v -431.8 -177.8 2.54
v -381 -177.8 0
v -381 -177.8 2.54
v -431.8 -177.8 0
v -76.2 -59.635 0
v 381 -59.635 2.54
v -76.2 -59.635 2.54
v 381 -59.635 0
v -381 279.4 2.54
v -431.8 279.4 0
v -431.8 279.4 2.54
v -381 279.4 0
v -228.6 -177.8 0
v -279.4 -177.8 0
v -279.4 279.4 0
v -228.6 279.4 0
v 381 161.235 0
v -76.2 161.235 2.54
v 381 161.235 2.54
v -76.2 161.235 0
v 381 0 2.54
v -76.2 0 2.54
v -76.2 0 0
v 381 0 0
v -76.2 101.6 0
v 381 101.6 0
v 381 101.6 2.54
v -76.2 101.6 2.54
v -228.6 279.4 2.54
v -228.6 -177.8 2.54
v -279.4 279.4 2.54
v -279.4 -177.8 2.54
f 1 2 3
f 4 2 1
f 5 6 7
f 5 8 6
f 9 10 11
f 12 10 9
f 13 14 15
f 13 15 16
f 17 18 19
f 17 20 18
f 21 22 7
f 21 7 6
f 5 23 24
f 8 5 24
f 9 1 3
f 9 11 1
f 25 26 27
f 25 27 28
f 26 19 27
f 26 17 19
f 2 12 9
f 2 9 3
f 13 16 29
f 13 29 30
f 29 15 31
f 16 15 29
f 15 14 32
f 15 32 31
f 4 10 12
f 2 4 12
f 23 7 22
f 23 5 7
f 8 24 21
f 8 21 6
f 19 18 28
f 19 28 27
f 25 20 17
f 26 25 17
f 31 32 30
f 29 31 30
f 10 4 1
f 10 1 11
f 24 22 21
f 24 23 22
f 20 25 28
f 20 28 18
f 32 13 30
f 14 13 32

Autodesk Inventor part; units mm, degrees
ref_plane "YZ Plane" through (0, 0, 0) normal (1, 0, 0) x (0, 1, 0)
ref_plane "XZ Plane" through (0, 0, 0) normal (0, 1, 0) x (-1, 0, 0)
ref_plane "XY Plane" through (0, 0, 0) normal (0, 0, 1) x (1, 0, 0)
ref_plane "Work Plane1" through (0, 0, 0) normal (0, 0, 1) x (1, 0, 0)
sketch "Sketch3" plane through (0, 0, 0) normal (0, 0, 1) x (1, 0, 0)
  line L0 (-431.8, 279.4) -> (-381, 279.4)
  line L1 (-381, 279.4) -> (-381, -177.8)
  line L2 (-381, -177.8) -> (-431.8, -177.8)
  line L3 (-431.8, -177.8) -> (-431.8, 279.4)
  line L4 (-279.4, 279.4) -> (-228.6, 279.4)
  line L5 (-228.6, 279.4) -> (-228.6, -177.8)
  line L6 (-228.6, -177.8) -> (-279.4, -177.8)
  line L7 (-279.4, -177.8) -> (-279.4, 279.4)
  line L8 (-76.2, 161.2348) -> (381, 161.2348)
  line L9 (381, 161.2348) -> (381, 101.6)
  line L10 (381, 101.6) -> (-76.2, 101.6)
  line L11 (-76.2, 101.6) -> (-76.2, 161.2348)
  line L12 (-76.2, 0) -> (381, 0)
  line L13 (381, 0) -> (381, -59.6348)
  line L14 (381, -59.6348) -> (-76.2, -59.6348)
  line L15 (-76.2, -59.6348) -> (-76.2, 0)
  line L16 (-177.8, -457.2) -> (-177.8, -381) projected
  line L17 (-177.8, -381) -> (177.8, -381) projected
  line L18 (177.8, -381) -> (177.8, -457.2) projected
  line L19 (177.8, -457.2) -> (609.6, -457.2) projected
  line L20 (609.6, -457.2) -> (609.6, 457.2) projected
  line L21 (609.6, 457.2) -> (-609.6, 457.2) projected
  line L22 (-609.6, 457.2) -> (-609.6, -457.2) projected
  line L23 (-609.6, -457.2) -> (-177.8, -457.2) projected
  line L24 (-279.4, -177.8) -> (-381, -177.8) projected
  line L25 (-381, -177.8) -> (-381, 279.4) projected
  line L26 (-381, 279.4) -> (-279.4, 279.4) projected
  line L27 (-279.4, 279.4) -> (-279.4, -177.8) projected
  line L28 (381, 101.6) -> (381, 0) projected
  line L29 (381, 0) -> (-76.2, 0) projected
  line L30 (-76.2, 0) -> (-76.2, 101.6) projected
  line L31 (-76.2, 101.6) -> (381, 101.6) projected
  point P0 (0, 0)
  dimension "d4" = 50.8
extrude "Extrusion2" add sketch "Sketch3" along normal blind 2.54 contours L0 L1 L2 L3 | L4 L5 L6 L7 | L8 L9 L10 L11 | L12 L13 L14 L15
properties part number "RetroTape"
